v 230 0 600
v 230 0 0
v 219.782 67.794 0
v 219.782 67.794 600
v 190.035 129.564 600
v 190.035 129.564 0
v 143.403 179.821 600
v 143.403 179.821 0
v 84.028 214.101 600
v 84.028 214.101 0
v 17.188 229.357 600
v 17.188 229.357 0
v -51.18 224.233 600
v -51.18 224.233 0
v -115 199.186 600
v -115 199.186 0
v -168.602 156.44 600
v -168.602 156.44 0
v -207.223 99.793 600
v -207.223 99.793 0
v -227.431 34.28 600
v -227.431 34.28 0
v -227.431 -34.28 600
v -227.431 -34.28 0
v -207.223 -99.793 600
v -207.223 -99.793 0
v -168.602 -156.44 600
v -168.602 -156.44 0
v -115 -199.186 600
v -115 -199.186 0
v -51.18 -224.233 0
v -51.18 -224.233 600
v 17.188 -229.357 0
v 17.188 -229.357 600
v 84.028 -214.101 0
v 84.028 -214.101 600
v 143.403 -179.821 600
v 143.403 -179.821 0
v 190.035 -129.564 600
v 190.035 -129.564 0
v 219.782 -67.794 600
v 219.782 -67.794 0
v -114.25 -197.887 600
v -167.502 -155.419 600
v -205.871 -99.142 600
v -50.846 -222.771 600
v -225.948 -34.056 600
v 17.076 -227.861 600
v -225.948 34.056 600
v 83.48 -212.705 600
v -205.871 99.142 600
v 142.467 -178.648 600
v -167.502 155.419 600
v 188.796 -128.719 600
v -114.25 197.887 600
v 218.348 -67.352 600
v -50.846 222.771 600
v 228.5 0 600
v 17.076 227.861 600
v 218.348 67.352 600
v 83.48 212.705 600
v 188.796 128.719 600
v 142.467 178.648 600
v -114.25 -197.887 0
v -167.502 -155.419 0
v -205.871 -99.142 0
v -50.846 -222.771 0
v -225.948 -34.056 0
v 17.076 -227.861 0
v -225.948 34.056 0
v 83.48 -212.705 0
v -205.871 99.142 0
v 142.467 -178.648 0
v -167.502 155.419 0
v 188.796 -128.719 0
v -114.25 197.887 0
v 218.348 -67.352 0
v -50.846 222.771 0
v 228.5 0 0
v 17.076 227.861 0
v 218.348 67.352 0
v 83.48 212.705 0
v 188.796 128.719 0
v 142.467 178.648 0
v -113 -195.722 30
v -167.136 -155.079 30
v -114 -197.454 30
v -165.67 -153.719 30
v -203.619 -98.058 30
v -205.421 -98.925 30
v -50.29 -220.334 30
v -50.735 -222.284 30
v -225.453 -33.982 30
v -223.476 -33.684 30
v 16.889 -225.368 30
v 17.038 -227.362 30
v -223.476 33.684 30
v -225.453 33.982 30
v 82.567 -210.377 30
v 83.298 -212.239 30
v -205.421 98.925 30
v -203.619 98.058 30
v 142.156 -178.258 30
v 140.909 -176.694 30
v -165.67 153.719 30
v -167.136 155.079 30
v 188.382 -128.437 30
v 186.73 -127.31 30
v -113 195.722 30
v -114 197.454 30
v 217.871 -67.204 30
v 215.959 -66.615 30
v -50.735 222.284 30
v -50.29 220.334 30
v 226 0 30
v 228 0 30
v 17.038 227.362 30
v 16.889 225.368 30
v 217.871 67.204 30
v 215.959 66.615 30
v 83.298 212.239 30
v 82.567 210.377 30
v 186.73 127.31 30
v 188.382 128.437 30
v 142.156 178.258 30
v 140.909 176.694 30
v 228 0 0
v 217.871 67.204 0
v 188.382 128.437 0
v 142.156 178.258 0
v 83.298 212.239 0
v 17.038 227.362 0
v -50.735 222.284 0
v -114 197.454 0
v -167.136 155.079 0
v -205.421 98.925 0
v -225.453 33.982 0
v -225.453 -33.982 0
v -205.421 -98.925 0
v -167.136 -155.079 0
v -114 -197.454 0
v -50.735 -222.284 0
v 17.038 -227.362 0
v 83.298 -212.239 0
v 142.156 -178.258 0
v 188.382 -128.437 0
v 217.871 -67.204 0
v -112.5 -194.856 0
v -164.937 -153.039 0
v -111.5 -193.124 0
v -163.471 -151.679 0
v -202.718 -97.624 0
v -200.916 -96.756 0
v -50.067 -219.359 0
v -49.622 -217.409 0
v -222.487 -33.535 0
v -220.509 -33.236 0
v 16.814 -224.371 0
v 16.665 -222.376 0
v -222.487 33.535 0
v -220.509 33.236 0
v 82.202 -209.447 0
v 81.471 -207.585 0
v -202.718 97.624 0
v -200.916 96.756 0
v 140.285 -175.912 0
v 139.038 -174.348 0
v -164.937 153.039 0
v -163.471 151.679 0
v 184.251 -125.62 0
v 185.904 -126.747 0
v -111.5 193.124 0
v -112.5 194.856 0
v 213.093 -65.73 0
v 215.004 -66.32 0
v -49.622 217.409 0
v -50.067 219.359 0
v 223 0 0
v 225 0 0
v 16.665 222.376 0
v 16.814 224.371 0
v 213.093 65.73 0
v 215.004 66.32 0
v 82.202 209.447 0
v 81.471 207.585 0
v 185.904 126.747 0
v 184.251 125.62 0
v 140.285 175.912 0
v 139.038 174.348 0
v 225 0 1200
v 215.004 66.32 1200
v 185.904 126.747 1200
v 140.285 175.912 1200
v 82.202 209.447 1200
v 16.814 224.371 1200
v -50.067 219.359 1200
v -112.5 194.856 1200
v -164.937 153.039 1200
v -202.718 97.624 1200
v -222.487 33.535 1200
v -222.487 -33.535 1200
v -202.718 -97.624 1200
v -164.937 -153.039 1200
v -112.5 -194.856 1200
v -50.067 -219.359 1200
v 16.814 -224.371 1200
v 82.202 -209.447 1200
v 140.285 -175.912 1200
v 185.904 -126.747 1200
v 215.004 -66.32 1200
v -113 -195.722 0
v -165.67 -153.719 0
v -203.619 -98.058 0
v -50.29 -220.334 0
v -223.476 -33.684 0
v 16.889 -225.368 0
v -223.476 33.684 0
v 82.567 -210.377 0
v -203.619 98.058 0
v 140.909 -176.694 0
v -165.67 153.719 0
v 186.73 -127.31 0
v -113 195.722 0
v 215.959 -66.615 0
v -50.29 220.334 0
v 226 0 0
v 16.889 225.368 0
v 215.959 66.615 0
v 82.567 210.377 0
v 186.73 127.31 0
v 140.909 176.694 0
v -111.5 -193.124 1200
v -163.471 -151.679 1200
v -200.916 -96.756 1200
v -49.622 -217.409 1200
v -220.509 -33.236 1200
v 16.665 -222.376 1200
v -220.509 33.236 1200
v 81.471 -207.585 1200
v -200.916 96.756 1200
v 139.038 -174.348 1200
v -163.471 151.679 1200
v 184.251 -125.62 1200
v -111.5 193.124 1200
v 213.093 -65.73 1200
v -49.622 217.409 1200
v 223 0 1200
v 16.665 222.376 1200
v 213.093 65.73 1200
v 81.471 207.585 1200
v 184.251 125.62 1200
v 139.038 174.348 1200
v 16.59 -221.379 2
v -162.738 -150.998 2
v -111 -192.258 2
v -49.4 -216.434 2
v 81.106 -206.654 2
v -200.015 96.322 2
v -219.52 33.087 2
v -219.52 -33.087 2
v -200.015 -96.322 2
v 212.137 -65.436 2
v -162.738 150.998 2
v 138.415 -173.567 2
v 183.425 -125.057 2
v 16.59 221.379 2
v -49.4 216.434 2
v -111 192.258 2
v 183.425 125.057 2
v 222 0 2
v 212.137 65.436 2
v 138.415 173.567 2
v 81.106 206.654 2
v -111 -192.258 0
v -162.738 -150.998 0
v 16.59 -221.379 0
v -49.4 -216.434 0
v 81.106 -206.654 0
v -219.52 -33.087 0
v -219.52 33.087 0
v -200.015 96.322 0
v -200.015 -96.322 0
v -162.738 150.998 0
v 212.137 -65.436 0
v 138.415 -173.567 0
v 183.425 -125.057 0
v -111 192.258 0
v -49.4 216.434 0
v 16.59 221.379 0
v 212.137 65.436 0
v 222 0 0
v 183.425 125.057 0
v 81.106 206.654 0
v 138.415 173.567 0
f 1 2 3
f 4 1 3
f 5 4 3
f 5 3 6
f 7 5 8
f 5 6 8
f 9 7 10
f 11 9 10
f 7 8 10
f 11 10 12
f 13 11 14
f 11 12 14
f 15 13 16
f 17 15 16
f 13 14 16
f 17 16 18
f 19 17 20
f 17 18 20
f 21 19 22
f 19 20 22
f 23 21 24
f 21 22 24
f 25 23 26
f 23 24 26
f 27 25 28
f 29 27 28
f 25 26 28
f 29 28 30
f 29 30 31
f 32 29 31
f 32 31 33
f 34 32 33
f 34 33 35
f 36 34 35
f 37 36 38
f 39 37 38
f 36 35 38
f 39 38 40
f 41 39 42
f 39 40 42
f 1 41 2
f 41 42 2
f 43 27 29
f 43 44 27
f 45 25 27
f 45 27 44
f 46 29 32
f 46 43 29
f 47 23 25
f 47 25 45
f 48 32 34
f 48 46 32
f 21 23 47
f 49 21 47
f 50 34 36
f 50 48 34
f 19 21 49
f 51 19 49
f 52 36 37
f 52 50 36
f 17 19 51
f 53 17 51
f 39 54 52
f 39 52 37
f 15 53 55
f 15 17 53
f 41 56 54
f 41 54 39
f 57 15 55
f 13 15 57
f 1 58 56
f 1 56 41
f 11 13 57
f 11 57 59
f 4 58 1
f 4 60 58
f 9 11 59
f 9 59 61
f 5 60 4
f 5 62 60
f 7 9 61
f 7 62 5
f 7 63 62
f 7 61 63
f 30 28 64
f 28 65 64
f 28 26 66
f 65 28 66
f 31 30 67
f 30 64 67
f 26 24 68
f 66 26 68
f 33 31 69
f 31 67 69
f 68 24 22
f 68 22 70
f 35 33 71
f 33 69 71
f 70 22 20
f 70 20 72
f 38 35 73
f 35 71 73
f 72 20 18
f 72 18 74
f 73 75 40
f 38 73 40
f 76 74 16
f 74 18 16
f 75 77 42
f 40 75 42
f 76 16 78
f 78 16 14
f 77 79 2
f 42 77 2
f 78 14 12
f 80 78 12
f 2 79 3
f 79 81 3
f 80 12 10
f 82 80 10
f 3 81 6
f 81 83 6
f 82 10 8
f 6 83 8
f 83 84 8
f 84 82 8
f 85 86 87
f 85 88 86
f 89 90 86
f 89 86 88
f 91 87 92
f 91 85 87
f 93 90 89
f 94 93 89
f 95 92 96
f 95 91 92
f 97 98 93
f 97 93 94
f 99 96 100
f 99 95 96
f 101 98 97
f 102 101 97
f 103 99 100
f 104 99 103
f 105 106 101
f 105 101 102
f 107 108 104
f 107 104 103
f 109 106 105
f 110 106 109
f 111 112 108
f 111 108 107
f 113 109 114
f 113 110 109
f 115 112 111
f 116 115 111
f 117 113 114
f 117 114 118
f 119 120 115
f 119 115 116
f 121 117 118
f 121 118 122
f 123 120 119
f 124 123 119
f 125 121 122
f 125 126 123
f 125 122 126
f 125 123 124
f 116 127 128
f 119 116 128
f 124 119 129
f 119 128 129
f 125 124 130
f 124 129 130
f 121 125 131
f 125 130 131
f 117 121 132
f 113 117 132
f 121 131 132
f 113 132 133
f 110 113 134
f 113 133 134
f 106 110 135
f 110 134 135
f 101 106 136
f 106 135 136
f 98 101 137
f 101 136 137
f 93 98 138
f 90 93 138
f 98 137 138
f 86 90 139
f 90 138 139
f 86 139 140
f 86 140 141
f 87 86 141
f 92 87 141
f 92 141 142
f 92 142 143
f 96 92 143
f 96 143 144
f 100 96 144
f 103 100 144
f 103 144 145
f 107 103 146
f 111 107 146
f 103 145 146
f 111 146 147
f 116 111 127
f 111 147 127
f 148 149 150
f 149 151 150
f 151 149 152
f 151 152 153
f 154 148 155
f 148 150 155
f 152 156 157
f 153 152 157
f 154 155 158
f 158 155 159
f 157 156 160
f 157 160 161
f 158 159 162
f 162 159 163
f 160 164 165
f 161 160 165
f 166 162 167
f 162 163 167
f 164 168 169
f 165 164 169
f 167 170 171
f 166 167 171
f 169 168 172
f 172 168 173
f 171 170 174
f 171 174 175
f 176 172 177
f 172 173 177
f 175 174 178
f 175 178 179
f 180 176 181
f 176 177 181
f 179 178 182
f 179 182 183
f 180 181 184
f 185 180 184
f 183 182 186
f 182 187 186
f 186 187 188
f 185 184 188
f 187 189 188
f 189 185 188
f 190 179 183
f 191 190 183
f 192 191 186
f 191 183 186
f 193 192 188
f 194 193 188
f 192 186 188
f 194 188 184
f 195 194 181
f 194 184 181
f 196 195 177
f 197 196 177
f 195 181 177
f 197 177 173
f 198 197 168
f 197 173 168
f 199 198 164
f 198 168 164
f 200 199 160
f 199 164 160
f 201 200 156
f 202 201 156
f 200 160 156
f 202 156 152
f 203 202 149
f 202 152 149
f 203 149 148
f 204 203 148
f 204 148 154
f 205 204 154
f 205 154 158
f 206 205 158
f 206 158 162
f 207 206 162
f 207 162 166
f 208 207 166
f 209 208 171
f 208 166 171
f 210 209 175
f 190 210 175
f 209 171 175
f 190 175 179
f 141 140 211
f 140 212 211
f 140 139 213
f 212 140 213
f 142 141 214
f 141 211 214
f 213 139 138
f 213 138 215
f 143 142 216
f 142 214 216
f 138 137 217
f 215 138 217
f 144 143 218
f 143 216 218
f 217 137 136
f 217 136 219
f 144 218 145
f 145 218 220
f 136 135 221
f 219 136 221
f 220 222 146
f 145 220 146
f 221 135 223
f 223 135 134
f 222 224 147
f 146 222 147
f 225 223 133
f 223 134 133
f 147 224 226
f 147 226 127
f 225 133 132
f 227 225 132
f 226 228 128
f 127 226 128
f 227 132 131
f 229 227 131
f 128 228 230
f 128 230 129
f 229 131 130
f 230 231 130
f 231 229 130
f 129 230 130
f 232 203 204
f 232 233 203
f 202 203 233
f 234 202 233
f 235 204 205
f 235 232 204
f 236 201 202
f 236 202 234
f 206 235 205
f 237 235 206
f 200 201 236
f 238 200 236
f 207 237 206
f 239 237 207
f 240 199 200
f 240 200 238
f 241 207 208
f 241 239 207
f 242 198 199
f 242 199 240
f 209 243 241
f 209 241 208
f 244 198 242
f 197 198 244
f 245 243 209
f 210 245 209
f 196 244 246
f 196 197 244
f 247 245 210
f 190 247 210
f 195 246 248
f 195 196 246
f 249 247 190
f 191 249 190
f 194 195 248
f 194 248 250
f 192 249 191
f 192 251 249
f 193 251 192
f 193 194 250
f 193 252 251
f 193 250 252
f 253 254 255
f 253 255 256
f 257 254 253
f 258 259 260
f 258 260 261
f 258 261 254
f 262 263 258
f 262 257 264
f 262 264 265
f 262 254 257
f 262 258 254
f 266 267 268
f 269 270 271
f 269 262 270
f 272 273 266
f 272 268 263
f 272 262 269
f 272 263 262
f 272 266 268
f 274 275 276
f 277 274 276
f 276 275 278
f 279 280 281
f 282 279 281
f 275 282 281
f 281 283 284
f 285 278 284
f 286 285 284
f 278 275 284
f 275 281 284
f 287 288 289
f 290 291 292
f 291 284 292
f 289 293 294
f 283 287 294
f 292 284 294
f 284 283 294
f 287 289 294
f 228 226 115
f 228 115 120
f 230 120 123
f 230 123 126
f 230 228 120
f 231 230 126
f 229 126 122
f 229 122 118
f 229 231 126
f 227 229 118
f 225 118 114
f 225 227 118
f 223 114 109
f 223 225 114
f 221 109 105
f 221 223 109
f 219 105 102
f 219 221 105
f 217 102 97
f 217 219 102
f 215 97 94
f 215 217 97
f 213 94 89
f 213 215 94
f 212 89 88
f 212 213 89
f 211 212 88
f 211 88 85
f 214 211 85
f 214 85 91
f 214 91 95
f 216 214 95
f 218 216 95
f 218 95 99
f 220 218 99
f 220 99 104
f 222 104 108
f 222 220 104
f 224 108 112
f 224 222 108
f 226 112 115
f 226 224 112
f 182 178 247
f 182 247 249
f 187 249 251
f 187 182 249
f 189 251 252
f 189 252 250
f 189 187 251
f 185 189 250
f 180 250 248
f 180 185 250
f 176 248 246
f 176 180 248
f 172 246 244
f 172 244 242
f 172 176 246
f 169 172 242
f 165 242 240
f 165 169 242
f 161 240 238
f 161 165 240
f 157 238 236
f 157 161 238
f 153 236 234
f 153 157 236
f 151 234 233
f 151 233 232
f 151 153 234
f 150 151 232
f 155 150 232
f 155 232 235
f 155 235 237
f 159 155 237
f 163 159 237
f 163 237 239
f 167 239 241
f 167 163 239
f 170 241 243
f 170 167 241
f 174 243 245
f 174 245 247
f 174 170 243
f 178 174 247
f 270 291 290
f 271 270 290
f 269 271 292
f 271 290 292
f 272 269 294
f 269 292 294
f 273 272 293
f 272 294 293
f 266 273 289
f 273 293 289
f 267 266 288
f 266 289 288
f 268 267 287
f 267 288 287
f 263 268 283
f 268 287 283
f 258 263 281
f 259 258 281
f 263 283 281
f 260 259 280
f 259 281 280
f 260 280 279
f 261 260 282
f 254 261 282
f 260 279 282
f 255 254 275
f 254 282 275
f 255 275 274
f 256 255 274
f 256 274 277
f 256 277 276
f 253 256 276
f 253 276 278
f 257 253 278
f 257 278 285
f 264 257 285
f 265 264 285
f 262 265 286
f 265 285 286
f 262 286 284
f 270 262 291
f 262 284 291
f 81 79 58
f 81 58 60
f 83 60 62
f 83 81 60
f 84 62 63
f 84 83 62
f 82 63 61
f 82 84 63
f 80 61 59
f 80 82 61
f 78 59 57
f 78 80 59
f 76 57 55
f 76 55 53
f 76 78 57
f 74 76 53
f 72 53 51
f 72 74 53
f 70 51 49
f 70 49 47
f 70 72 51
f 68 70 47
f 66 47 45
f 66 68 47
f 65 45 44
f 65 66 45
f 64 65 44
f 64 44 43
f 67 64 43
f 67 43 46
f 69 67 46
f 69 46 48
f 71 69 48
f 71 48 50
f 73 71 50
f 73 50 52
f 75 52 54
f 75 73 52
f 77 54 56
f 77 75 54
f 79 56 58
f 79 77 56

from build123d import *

# Parameters (mm, degrees)
F0_R     = 230
F0_R_2   = 228.5
F1_DEPTH = 600
F2_R     = 222
F3_DEPTH = 2
F4_R     = 228
F4_R_2   = 226
F5_DEPTH = 30
F6_R     = 225
F6_R_2   = 223
F7_DEPTH = 1200


with BuildPart() as f1:
    # F0 (on Top) → F1 (new body)
    with BuildSketch(Plane.XY):
        Circle(F0_R)
        Circle(F0_R_2, mode=Mode.SUBTRACT)
    extrude(amount=F1_DEPTH)


with BuildPart() as f3:
    # F2 (on Top) → F3 (new body)
    with BuildSketch(Plane.XY):
        Circle(F2_R)
    extrude(amount=F3_DEPTH)


with BuildPart() as f5:
    # F4 (on Top) → F5 (new body)
    with BuildSketch(Plane.XY):
        Circle(F4_R)
        Circle(F4_R_2, mode=Mode.SUBTRACT)
    extrude(amount=F5_DEPTH)


with BuildPart() as f7:
    # F6 (on Top) → F7 (new body)
    with BuildSketch(Plane.XY):
        Circle(F6_R)
        Circle(F6_R_2, mode=Mode.SUBTRACT)
    extrude(amount=F7_DEPTH)


solid = Compound([f1.part, f3.part, f5.part, f7.part])
